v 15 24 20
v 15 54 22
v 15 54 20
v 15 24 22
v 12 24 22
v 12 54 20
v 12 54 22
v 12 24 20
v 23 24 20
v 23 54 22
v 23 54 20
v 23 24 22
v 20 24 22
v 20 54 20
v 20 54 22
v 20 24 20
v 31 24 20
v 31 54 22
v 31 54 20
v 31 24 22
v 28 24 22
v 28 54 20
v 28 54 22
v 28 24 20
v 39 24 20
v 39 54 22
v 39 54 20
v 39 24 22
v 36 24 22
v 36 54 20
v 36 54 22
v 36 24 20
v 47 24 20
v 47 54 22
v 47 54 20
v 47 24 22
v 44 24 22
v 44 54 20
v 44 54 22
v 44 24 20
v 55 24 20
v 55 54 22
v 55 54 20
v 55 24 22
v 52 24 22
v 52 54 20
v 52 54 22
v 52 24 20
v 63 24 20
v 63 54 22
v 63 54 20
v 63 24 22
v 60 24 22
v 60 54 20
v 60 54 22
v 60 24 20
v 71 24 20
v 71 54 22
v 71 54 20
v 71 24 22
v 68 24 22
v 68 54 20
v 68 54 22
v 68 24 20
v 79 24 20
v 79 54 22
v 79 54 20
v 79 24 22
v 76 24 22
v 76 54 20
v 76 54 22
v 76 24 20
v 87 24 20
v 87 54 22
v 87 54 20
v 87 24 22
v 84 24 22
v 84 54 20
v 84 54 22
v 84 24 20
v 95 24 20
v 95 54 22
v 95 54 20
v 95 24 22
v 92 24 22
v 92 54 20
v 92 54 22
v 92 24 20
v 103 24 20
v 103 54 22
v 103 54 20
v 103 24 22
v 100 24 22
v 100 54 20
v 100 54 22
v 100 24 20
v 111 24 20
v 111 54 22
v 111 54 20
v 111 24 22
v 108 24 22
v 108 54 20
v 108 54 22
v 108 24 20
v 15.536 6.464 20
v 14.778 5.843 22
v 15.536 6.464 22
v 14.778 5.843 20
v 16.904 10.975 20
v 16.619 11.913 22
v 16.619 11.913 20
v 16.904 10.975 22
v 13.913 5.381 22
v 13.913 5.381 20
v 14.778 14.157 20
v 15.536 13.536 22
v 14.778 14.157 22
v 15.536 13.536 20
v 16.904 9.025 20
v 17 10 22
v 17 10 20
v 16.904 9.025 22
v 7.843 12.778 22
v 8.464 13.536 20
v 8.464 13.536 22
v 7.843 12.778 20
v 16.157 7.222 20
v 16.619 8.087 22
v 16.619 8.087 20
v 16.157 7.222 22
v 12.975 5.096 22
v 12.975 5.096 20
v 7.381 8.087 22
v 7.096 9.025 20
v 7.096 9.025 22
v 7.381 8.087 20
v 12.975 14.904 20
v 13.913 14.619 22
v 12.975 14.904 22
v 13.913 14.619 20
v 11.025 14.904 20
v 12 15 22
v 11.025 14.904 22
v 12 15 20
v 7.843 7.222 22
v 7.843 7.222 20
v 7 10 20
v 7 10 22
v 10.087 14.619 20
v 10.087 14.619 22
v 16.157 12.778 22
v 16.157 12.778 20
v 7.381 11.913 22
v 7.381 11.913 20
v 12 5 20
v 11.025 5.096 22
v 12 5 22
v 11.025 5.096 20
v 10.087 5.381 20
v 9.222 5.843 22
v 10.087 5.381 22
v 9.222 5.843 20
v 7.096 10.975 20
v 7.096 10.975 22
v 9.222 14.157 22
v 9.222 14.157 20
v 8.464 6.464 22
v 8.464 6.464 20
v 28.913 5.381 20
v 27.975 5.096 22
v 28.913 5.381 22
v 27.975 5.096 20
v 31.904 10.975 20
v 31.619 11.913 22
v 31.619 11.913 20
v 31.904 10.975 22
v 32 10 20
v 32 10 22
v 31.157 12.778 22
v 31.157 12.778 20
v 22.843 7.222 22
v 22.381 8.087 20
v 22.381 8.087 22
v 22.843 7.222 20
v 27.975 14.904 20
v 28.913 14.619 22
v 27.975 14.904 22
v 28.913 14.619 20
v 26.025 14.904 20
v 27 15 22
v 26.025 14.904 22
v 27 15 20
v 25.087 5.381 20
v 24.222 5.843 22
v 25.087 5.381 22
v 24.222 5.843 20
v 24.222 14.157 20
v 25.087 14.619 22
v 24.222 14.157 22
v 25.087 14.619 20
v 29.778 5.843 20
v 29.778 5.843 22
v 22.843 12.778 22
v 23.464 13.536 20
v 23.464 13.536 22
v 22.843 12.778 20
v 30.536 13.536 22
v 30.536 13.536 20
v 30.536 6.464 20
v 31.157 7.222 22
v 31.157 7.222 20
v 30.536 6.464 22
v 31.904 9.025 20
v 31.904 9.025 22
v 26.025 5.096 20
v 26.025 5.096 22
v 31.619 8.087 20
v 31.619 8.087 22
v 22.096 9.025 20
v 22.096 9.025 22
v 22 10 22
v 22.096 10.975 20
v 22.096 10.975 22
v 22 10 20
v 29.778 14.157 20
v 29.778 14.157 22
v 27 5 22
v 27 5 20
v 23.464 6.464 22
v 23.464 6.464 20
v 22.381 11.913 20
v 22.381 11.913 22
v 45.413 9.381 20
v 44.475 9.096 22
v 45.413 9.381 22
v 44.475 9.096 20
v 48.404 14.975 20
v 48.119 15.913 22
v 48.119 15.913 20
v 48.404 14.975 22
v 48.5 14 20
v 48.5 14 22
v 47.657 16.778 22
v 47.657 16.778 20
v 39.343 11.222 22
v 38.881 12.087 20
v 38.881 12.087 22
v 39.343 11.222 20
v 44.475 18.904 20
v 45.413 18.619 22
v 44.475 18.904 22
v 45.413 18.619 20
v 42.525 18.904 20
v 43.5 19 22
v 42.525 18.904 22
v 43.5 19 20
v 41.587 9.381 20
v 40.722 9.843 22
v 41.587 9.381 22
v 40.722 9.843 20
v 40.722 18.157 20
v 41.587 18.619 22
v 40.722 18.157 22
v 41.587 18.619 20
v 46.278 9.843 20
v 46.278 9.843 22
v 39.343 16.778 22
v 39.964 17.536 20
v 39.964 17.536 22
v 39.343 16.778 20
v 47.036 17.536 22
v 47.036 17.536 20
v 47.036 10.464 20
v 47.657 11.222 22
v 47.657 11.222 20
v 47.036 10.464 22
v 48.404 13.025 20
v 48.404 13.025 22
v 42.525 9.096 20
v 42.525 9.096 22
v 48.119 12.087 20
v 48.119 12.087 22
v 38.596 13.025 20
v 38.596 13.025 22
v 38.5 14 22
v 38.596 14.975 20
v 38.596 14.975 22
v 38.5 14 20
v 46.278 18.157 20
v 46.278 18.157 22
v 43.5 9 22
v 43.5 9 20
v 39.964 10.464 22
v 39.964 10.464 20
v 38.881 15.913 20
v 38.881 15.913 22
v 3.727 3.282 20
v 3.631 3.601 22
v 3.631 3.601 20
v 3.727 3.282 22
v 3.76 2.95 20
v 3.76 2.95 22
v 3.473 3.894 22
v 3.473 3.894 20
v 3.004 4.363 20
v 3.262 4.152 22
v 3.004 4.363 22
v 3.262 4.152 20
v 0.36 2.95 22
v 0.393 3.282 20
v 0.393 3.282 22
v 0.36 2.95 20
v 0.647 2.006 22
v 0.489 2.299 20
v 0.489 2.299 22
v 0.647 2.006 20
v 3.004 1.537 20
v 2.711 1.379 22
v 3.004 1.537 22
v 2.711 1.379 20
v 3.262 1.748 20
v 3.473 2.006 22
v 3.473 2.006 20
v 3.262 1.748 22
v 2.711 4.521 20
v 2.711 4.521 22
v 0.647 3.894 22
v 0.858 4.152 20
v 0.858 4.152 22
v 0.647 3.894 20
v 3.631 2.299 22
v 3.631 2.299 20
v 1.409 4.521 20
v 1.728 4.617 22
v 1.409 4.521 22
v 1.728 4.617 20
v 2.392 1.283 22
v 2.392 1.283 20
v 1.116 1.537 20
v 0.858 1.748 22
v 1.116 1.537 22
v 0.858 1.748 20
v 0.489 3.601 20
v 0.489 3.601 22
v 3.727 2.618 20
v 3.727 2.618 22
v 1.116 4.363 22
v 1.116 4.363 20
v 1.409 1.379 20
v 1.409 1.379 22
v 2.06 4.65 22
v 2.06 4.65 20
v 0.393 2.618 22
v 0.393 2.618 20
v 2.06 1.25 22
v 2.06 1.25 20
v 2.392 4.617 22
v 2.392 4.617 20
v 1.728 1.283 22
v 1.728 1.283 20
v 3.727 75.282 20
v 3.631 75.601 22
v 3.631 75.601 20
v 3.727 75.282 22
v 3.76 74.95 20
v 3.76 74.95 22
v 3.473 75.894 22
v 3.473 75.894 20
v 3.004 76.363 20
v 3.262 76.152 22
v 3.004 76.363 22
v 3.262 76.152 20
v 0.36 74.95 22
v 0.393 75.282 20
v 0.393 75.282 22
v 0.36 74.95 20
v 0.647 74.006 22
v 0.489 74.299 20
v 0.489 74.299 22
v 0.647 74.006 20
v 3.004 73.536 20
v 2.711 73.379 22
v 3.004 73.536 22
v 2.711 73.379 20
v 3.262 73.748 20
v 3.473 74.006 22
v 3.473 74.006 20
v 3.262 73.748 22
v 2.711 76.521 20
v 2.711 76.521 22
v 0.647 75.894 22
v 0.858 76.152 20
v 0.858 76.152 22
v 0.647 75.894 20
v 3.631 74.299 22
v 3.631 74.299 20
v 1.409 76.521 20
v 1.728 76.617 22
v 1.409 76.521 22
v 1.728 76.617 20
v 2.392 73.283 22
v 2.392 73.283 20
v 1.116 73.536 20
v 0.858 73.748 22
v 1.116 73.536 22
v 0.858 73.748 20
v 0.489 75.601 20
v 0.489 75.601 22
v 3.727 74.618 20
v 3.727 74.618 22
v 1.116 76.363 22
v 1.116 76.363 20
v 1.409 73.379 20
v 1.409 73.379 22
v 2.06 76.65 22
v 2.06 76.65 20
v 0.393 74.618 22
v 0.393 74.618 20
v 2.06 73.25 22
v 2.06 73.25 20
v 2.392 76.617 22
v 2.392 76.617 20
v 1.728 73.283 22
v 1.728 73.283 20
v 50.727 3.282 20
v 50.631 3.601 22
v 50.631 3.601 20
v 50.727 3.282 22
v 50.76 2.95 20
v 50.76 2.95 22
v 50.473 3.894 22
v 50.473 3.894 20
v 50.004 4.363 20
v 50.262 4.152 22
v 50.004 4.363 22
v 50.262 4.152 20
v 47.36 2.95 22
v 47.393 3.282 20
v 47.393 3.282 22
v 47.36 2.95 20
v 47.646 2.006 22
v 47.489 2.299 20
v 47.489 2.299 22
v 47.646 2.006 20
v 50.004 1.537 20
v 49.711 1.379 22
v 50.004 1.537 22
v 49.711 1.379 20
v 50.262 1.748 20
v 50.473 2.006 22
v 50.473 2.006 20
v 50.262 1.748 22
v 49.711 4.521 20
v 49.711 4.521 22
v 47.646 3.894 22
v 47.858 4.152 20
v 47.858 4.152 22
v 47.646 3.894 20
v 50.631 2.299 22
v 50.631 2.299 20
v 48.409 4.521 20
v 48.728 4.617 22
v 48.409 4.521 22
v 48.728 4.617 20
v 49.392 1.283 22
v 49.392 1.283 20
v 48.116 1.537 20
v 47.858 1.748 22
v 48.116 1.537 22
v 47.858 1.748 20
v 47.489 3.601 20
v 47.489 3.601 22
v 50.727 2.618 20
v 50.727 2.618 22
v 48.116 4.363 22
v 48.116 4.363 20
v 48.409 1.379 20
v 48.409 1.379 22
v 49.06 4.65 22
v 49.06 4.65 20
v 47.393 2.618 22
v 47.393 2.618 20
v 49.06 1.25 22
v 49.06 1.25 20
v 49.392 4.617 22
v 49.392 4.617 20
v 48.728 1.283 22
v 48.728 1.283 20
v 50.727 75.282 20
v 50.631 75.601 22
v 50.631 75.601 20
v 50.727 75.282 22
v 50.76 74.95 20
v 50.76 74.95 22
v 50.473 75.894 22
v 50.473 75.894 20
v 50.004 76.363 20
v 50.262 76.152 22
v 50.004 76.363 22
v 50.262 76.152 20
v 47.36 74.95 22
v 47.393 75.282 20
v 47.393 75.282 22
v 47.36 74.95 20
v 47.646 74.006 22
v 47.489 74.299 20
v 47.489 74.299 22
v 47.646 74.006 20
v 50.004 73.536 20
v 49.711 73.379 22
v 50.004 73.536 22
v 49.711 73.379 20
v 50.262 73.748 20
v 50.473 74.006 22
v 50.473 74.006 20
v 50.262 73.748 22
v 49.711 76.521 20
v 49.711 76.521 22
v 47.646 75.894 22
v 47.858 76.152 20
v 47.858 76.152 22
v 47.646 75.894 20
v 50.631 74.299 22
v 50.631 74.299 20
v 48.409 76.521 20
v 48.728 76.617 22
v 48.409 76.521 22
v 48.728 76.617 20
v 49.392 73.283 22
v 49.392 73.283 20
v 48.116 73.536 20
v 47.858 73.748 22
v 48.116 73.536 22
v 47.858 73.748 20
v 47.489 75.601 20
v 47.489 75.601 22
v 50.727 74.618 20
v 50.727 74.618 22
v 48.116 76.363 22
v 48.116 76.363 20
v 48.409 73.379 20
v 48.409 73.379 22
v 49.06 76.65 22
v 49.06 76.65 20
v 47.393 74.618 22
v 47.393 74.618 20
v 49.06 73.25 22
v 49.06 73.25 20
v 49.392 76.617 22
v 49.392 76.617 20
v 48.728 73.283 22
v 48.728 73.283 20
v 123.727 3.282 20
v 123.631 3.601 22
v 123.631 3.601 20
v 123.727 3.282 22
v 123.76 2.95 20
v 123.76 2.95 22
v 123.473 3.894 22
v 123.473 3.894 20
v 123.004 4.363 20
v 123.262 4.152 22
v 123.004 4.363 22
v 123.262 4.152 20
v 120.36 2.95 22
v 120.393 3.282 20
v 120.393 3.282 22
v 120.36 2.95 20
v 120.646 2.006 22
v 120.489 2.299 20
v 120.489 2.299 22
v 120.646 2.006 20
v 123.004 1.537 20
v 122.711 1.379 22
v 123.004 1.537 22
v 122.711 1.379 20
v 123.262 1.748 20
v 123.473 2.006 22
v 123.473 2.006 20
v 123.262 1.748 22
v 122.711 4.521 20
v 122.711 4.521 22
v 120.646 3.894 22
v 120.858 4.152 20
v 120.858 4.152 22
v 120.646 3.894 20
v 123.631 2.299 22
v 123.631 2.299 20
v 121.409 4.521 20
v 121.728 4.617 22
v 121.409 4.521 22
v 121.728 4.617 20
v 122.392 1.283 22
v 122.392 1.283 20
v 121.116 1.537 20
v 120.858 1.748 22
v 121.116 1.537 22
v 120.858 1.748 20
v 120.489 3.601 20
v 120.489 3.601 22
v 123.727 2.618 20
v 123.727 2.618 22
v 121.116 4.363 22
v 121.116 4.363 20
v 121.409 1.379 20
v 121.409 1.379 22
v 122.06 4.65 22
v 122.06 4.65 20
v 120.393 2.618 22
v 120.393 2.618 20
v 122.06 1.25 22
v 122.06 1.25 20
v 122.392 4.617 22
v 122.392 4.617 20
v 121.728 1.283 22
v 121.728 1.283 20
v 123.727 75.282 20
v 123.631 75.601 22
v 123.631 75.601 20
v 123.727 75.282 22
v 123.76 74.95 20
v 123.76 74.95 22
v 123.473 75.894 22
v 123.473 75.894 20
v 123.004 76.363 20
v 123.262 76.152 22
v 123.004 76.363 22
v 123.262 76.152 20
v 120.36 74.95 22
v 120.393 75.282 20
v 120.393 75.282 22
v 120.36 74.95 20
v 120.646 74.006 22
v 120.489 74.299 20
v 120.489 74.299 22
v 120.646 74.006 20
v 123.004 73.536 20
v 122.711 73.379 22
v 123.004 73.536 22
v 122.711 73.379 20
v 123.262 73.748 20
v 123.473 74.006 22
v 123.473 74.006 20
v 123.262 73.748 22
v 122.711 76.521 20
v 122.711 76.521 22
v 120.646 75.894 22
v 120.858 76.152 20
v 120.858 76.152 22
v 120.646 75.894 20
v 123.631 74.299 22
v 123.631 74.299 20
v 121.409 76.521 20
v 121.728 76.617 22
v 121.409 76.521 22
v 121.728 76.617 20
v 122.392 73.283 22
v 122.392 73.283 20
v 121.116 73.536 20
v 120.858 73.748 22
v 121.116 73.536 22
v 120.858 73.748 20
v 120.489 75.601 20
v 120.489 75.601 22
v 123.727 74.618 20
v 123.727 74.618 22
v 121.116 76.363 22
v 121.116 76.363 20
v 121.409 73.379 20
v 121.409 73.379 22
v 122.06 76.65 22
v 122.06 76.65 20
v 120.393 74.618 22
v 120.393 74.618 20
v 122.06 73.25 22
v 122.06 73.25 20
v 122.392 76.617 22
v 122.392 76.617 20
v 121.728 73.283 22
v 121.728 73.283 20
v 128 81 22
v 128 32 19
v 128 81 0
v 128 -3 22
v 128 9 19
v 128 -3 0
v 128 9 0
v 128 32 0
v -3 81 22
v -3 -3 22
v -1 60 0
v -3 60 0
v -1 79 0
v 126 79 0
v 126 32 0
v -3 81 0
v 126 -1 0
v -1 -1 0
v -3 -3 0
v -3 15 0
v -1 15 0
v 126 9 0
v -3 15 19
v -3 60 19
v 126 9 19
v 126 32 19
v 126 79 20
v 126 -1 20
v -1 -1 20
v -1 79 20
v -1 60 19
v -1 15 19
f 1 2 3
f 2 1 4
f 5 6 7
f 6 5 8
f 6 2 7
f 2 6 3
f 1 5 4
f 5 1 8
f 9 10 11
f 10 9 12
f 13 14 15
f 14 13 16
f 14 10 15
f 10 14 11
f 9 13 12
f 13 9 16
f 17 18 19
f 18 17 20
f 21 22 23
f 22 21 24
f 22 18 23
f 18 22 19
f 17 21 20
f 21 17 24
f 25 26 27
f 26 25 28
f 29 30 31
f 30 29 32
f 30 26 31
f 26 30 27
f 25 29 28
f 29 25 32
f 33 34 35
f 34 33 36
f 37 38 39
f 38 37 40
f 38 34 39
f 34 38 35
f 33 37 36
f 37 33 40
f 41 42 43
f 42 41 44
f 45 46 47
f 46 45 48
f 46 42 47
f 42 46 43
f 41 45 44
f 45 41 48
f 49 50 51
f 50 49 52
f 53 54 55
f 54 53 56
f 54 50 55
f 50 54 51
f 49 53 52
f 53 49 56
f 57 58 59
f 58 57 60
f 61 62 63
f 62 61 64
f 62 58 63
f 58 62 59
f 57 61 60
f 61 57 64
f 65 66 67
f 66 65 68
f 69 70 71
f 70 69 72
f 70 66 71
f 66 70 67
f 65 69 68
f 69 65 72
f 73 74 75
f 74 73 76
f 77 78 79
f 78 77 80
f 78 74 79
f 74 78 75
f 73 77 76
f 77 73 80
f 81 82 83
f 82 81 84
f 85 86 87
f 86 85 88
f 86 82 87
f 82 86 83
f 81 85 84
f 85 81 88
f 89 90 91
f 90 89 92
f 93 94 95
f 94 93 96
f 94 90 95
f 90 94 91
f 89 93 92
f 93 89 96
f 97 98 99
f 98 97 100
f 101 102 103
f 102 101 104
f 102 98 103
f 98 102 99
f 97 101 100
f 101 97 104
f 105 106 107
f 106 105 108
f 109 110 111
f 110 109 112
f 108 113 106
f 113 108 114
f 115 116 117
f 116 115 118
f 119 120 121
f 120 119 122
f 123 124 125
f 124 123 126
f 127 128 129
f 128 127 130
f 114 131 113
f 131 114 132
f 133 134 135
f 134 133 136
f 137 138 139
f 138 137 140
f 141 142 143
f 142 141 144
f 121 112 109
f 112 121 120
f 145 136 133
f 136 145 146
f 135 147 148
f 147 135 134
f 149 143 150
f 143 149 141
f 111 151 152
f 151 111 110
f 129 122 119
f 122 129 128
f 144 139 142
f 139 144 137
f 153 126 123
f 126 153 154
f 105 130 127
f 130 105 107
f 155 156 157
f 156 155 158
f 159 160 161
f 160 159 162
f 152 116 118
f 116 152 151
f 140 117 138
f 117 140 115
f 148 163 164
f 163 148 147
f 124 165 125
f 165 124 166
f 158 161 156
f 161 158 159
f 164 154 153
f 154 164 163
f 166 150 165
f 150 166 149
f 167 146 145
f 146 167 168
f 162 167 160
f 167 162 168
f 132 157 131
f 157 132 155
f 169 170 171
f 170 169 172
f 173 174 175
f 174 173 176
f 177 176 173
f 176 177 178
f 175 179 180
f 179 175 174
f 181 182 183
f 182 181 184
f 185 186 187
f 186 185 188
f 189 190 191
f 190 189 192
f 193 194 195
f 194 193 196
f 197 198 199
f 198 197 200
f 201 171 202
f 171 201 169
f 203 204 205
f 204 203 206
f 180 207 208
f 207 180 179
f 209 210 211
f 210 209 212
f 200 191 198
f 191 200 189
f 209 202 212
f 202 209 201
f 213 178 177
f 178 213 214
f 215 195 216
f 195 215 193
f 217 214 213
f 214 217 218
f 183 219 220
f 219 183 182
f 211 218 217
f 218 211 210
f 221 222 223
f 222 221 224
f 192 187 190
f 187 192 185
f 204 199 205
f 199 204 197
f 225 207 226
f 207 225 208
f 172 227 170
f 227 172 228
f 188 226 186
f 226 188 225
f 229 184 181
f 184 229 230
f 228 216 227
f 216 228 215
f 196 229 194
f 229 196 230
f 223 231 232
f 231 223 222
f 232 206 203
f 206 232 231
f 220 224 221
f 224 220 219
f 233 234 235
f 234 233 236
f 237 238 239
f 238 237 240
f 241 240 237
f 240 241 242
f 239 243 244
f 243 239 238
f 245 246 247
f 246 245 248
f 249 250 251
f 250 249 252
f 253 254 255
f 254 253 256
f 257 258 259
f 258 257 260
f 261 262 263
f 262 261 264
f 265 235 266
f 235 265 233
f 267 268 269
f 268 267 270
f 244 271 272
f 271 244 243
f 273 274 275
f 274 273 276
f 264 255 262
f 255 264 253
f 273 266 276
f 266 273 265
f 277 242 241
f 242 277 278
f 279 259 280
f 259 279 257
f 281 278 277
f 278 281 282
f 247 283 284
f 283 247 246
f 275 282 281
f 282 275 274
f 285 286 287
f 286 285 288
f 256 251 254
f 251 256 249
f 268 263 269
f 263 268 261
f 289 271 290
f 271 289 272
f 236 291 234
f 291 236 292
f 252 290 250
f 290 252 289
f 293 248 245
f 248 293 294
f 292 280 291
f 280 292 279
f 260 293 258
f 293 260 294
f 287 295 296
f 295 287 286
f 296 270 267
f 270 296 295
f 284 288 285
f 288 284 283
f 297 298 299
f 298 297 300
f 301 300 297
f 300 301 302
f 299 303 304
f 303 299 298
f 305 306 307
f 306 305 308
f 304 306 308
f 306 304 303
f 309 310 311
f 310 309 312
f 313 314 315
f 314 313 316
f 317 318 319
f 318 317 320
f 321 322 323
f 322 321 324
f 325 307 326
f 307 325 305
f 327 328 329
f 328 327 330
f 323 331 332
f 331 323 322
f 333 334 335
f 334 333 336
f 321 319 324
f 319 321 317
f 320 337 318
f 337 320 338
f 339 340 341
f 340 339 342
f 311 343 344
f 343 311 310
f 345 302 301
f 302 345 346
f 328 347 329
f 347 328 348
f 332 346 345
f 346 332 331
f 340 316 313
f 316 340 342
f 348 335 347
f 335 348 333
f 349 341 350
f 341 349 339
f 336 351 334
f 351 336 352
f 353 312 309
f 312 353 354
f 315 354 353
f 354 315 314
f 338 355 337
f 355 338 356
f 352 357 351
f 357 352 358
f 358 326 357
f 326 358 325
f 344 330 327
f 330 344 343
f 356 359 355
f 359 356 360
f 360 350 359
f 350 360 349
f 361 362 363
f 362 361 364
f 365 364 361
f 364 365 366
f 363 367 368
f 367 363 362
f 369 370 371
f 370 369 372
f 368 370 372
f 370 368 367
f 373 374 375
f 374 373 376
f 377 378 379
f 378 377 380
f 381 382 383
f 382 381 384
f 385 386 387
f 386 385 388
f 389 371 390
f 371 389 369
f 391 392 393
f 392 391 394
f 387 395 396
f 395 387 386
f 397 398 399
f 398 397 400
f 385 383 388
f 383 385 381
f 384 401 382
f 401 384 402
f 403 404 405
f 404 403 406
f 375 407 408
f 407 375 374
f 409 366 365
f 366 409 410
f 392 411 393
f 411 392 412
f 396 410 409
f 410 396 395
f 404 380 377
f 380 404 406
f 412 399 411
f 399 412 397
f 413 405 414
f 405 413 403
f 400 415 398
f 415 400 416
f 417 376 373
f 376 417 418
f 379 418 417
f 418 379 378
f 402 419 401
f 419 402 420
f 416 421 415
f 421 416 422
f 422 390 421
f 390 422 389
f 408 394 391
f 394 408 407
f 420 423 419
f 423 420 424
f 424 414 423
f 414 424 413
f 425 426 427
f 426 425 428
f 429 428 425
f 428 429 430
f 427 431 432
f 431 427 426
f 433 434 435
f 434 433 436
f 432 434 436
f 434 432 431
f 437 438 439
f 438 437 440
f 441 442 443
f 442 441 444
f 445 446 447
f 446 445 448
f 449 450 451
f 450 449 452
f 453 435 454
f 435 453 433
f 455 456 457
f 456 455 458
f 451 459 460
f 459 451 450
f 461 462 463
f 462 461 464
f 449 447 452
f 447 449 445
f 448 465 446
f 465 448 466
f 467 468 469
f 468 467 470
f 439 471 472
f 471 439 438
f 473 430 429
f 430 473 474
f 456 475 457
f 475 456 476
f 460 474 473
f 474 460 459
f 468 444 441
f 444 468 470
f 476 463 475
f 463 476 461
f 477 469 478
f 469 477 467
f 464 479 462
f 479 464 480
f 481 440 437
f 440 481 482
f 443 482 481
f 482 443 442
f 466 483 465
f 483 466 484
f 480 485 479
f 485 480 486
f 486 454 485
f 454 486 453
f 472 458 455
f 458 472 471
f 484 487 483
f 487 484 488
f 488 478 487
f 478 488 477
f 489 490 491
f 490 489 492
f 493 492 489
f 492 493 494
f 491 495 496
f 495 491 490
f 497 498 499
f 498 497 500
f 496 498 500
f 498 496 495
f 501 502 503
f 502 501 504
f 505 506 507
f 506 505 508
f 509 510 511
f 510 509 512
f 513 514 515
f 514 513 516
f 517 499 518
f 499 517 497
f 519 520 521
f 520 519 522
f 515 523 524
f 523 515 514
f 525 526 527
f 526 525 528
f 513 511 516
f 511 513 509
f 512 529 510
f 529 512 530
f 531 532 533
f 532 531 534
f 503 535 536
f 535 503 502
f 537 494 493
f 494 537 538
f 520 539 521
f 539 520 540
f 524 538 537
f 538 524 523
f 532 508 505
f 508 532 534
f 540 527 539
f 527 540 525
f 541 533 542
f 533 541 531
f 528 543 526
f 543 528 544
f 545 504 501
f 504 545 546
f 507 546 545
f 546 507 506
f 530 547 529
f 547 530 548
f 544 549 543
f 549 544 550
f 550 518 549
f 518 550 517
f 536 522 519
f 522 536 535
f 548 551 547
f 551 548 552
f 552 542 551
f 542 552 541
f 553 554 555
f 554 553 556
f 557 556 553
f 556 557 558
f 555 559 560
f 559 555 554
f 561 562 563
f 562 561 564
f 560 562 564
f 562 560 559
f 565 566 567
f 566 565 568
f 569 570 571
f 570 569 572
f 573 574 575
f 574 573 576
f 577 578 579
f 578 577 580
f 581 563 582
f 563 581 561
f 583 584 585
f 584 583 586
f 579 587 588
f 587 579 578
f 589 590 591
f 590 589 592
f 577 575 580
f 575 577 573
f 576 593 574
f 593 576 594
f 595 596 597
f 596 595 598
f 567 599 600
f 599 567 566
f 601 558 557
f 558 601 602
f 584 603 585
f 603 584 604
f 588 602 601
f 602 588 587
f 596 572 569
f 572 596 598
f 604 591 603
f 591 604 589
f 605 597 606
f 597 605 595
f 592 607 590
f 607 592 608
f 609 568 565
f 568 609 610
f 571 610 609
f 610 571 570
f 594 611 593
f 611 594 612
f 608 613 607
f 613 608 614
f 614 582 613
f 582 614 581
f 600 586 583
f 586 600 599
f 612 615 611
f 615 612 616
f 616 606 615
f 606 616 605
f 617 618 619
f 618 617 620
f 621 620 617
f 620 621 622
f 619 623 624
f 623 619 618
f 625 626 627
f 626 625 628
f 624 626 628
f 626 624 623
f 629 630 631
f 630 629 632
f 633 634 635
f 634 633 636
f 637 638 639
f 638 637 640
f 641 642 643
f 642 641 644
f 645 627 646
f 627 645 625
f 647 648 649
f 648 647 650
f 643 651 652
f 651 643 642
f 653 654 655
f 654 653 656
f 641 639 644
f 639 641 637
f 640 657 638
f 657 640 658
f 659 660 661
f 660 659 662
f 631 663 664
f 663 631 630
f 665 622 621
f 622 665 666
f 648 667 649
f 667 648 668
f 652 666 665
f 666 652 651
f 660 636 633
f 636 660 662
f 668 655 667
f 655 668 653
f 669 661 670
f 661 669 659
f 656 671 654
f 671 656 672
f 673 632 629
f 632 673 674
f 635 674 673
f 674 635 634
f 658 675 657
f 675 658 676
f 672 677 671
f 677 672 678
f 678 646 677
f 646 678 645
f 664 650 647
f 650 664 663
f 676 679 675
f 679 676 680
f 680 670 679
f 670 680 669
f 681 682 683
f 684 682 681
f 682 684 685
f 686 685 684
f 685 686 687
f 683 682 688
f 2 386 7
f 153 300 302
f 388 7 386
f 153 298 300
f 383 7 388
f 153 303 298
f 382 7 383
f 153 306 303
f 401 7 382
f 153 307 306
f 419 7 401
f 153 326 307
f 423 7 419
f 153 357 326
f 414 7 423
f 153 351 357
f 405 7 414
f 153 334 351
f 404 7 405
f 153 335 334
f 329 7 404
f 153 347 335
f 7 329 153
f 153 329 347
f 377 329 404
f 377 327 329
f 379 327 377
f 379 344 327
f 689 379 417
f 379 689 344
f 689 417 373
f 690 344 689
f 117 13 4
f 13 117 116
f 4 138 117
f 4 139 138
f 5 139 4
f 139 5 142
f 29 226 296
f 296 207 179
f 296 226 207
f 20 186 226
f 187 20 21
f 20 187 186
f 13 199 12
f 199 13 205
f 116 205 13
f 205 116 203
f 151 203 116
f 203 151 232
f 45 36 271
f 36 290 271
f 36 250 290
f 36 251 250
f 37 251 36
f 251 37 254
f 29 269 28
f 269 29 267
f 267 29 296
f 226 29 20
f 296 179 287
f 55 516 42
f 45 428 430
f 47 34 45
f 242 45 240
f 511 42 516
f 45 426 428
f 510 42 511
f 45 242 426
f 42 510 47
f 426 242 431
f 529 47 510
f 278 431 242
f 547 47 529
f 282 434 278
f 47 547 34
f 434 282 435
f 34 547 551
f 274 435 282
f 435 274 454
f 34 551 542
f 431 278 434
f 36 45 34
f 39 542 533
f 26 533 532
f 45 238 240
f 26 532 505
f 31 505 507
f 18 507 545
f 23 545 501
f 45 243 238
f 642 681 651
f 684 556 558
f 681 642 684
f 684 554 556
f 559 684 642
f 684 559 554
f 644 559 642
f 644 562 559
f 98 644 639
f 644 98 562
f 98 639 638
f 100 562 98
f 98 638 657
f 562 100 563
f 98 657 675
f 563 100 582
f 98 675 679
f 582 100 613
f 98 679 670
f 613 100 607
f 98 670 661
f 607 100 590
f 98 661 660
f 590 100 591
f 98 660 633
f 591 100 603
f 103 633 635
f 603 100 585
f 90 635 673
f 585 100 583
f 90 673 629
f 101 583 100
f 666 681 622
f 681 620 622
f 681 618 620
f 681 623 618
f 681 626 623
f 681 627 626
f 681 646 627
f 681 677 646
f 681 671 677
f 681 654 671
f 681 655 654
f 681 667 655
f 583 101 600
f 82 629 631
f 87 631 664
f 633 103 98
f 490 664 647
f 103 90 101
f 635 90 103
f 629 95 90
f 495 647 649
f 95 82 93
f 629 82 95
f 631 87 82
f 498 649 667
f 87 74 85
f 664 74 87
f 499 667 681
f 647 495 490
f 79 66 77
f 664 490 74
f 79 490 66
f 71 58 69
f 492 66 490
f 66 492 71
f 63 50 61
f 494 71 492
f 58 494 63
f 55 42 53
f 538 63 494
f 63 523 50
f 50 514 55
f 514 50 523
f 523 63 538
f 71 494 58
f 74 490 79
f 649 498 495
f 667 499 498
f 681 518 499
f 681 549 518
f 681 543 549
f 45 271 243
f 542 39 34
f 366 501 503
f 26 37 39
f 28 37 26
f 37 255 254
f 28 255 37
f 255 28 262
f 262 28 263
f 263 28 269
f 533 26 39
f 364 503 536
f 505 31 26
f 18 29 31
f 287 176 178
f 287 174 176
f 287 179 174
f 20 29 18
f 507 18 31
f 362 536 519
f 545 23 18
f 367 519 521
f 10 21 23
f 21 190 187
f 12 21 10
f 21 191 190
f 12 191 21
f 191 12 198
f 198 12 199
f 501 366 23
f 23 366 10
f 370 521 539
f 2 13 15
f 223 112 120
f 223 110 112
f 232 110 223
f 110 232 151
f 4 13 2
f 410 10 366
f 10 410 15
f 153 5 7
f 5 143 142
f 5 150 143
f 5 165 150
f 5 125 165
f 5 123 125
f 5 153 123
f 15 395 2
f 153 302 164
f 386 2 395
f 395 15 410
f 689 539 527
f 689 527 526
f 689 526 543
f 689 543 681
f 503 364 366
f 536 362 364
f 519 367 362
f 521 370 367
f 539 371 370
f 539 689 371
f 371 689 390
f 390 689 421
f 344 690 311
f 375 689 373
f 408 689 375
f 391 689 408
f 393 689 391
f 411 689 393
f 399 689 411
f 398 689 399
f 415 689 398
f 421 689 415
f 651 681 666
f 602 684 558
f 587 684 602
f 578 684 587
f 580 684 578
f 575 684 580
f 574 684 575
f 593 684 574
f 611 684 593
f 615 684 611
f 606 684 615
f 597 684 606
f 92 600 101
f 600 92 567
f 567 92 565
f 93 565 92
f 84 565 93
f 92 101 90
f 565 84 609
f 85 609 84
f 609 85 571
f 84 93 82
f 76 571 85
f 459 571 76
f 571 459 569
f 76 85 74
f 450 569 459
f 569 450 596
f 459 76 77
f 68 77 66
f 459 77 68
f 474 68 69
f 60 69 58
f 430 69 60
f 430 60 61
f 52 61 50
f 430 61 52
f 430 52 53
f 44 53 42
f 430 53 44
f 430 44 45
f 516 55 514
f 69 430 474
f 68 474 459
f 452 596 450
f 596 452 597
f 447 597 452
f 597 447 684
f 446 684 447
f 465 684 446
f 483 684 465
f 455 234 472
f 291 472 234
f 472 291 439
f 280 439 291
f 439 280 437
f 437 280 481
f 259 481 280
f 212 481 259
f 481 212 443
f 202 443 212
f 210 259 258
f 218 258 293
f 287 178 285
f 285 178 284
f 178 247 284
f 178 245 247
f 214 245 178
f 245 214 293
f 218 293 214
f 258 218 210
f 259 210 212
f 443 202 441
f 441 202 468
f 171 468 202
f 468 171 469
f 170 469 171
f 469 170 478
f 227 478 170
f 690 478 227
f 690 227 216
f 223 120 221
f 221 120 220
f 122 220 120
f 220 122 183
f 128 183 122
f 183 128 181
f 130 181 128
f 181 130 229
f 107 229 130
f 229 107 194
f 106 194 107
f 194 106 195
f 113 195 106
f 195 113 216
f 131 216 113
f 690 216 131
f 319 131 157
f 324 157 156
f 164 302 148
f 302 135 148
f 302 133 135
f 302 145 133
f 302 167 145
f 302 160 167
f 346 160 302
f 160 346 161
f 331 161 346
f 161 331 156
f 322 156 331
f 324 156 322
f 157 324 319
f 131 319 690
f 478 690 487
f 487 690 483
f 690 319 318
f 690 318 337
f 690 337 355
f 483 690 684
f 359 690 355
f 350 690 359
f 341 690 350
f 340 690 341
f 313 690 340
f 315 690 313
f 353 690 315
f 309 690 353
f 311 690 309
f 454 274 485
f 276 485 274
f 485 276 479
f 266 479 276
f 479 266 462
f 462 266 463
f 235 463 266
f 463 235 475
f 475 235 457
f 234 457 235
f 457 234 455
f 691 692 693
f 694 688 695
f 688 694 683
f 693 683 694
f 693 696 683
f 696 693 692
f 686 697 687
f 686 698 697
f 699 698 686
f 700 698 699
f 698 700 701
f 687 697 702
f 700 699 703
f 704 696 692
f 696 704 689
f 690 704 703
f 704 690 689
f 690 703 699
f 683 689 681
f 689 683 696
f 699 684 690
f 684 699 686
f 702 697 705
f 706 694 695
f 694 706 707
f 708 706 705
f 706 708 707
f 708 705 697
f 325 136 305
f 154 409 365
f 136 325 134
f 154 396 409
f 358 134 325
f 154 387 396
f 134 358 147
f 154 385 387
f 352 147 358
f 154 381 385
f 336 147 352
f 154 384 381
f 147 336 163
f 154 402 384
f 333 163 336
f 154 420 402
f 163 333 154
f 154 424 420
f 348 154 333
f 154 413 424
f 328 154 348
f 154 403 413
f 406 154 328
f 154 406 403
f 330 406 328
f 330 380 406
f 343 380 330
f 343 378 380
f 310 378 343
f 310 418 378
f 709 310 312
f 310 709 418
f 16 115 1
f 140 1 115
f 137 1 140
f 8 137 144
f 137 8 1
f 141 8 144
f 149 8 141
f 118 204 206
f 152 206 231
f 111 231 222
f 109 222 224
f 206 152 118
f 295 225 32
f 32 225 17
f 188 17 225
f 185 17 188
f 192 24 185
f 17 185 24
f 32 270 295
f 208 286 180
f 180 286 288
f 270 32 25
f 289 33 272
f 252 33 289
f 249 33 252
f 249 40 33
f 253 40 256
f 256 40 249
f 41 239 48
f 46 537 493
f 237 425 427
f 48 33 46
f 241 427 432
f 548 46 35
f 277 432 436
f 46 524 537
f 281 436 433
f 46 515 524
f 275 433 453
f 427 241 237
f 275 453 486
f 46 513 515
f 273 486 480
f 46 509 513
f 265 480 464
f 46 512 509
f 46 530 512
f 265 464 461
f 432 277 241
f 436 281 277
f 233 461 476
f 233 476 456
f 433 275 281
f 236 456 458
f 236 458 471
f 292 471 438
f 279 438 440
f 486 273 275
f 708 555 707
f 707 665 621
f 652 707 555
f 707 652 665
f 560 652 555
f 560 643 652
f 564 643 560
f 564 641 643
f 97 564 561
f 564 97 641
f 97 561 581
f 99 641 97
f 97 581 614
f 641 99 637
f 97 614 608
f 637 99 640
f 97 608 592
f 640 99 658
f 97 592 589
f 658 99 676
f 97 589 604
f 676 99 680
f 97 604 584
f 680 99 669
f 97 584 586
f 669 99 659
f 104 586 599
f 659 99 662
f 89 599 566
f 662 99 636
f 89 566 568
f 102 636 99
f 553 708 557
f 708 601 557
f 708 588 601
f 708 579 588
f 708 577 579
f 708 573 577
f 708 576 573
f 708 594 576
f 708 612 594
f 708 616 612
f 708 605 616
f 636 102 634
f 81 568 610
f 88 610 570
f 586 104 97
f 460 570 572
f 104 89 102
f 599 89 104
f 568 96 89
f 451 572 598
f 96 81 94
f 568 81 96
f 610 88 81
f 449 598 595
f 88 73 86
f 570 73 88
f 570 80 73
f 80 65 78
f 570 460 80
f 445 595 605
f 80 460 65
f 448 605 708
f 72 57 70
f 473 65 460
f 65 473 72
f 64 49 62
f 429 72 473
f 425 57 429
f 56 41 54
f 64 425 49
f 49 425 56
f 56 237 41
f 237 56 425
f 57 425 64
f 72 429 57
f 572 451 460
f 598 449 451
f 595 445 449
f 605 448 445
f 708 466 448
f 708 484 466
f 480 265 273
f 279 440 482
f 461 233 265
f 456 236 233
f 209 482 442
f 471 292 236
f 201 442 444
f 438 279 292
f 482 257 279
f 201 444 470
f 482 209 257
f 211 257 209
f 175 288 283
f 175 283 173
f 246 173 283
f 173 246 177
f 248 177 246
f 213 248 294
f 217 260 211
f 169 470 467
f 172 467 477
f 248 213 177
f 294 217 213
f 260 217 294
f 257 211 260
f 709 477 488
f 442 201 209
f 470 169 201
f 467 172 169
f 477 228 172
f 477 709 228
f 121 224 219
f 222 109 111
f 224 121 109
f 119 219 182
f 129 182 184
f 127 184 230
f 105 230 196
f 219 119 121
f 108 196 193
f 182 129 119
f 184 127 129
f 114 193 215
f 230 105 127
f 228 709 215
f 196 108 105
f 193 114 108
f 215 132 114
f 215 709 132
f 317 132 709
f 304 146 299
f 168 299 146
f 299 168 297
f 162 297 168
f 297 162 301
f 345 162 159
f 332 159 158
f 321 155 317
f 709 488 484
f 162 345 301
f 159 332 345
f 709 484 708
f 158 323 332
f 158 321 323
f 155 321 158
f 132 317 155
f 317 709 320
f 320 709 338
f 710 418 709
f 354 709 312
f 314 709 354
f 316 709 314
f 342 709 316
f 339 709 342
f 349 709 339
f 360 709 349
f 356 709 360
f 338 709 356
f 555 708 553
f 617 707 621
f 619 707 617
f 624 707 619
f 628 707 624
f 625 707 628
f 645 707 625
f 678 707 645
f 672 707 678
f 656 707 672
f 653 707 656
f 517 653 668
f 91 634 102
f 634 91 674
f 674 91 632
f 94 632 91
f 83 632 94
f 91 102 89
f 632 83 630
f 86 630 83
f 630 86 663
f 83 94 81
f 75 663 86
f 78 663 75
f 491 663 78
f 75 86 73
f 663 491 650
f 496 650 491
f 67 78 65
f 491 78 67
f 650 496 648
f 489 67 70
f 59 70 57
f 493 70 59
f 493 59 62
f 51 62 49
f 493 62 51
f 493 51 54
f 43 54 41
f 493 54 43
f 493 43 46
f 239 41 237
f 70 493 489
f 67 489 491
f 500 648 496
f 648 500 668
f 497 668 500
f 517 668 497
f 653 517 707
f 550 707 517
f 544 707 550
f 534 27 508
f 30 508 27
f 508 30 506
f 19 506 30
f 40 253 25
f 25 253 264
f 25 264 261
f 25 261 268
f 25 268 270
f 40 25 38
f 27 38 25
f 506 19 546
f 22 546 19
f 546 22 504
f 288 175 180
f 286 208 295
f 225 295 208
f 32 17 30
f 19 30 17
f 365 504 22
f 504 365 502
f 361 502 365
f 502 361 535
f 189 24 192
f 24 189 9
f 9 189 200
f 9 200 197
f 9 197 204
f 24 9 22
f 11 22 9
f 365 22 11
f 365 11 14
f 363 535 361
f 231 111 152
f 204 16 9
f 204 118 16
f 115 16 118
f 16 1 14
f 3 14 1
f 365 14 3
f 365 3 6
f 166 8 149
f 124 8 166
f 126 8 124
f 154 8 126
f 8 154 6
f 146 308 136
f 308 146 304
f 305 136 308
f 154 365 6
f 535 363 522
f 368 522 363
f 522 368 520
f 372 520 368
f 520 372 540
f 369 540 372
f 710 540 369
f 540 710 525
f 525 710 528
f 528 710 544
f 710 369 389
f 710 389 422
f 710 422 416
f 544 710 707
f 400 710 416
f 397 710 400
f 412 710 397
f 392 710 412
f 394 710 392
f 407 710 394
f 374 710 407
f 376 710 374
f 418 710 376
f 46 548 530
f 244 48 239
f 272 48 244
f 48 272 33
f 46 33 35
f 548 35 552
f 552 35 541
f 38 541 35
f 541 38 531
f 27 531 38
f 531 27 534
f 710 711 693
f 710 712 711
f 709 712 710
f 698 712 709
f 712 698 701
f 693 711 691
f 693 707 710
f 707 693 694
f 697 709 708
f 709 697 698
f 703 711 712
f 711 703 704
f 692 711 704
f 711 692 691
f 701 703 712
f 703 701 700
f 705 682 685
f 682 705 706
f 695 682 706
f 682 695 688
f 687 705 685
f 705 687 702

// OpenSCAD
// Parametric mechanical CONCEPT. Not validated against assembled Tab5/Core.
// Units:mm. The carrier model usesx2..127,y1..79; this cover origin isx2,y1.
// Export only after actual spacer length, Core height and connector access review.
board_x=125;
board_y=78;
wall=2;
clearance=1;
cover_inner_height=20; // placeholder: measure actual tallest part + safe clearance
cover_top=2;
mount_boss_od=7;
mount_hole=3.4;
mounts=[[2.06,2.95],[2.06,74.95],[49.06,2.95],[49.06,74.95],[122.06,2.95],[122.06,74.95]];
// Two halves are intentionally not auto-produced: backplate would obstruct Tab5.
// A protective front cap fastens to separately selected insulating spacers.
module cover(){
 difference(){
  translate([-clearance-wall,-clearance-wall,0])
   cube([board_x+2*(clearance+wall),board_y+2*(clearance+wall),cover_inner_height+cover_top]);
  translate([-clearance,-clearance,-.1])cube([board_x+2*clearance,board_y+2*clearance,cover_inner_height+.1]);
  // Large cable-access openings; final sizes depend on connector drawings/cables.
  translate([-clearance-wall-1,15,-1])cube([wall+clearance+5,45,cover_inner_height]);
  translate([board_x-5,9,-1])cube([wall+clearance+7,23,cover_inner_height]);
  // Ventilation slots over FPGA and power areas; no claimed thermal qualification.
  for(x=[12:8:112])translate([x,24,cover_inner_height-.1])cube([3,30,cover_top+.2]);
  // User access to controls. Must be aligned after mechanical validation.
  for(p=[[12,10],[27,10],[43.5,14]])translate([p[0],p[1],cover_inner_height-.1])cylinder(d=10,h=cover_top+.2,$fn=32);
  for(p=mounts)translate([p[0],p[1],-.1])cylinder(d=mount_hole,h=cover_inner_height+cover_top+.2,$fn=32);
 }
}
cover();
